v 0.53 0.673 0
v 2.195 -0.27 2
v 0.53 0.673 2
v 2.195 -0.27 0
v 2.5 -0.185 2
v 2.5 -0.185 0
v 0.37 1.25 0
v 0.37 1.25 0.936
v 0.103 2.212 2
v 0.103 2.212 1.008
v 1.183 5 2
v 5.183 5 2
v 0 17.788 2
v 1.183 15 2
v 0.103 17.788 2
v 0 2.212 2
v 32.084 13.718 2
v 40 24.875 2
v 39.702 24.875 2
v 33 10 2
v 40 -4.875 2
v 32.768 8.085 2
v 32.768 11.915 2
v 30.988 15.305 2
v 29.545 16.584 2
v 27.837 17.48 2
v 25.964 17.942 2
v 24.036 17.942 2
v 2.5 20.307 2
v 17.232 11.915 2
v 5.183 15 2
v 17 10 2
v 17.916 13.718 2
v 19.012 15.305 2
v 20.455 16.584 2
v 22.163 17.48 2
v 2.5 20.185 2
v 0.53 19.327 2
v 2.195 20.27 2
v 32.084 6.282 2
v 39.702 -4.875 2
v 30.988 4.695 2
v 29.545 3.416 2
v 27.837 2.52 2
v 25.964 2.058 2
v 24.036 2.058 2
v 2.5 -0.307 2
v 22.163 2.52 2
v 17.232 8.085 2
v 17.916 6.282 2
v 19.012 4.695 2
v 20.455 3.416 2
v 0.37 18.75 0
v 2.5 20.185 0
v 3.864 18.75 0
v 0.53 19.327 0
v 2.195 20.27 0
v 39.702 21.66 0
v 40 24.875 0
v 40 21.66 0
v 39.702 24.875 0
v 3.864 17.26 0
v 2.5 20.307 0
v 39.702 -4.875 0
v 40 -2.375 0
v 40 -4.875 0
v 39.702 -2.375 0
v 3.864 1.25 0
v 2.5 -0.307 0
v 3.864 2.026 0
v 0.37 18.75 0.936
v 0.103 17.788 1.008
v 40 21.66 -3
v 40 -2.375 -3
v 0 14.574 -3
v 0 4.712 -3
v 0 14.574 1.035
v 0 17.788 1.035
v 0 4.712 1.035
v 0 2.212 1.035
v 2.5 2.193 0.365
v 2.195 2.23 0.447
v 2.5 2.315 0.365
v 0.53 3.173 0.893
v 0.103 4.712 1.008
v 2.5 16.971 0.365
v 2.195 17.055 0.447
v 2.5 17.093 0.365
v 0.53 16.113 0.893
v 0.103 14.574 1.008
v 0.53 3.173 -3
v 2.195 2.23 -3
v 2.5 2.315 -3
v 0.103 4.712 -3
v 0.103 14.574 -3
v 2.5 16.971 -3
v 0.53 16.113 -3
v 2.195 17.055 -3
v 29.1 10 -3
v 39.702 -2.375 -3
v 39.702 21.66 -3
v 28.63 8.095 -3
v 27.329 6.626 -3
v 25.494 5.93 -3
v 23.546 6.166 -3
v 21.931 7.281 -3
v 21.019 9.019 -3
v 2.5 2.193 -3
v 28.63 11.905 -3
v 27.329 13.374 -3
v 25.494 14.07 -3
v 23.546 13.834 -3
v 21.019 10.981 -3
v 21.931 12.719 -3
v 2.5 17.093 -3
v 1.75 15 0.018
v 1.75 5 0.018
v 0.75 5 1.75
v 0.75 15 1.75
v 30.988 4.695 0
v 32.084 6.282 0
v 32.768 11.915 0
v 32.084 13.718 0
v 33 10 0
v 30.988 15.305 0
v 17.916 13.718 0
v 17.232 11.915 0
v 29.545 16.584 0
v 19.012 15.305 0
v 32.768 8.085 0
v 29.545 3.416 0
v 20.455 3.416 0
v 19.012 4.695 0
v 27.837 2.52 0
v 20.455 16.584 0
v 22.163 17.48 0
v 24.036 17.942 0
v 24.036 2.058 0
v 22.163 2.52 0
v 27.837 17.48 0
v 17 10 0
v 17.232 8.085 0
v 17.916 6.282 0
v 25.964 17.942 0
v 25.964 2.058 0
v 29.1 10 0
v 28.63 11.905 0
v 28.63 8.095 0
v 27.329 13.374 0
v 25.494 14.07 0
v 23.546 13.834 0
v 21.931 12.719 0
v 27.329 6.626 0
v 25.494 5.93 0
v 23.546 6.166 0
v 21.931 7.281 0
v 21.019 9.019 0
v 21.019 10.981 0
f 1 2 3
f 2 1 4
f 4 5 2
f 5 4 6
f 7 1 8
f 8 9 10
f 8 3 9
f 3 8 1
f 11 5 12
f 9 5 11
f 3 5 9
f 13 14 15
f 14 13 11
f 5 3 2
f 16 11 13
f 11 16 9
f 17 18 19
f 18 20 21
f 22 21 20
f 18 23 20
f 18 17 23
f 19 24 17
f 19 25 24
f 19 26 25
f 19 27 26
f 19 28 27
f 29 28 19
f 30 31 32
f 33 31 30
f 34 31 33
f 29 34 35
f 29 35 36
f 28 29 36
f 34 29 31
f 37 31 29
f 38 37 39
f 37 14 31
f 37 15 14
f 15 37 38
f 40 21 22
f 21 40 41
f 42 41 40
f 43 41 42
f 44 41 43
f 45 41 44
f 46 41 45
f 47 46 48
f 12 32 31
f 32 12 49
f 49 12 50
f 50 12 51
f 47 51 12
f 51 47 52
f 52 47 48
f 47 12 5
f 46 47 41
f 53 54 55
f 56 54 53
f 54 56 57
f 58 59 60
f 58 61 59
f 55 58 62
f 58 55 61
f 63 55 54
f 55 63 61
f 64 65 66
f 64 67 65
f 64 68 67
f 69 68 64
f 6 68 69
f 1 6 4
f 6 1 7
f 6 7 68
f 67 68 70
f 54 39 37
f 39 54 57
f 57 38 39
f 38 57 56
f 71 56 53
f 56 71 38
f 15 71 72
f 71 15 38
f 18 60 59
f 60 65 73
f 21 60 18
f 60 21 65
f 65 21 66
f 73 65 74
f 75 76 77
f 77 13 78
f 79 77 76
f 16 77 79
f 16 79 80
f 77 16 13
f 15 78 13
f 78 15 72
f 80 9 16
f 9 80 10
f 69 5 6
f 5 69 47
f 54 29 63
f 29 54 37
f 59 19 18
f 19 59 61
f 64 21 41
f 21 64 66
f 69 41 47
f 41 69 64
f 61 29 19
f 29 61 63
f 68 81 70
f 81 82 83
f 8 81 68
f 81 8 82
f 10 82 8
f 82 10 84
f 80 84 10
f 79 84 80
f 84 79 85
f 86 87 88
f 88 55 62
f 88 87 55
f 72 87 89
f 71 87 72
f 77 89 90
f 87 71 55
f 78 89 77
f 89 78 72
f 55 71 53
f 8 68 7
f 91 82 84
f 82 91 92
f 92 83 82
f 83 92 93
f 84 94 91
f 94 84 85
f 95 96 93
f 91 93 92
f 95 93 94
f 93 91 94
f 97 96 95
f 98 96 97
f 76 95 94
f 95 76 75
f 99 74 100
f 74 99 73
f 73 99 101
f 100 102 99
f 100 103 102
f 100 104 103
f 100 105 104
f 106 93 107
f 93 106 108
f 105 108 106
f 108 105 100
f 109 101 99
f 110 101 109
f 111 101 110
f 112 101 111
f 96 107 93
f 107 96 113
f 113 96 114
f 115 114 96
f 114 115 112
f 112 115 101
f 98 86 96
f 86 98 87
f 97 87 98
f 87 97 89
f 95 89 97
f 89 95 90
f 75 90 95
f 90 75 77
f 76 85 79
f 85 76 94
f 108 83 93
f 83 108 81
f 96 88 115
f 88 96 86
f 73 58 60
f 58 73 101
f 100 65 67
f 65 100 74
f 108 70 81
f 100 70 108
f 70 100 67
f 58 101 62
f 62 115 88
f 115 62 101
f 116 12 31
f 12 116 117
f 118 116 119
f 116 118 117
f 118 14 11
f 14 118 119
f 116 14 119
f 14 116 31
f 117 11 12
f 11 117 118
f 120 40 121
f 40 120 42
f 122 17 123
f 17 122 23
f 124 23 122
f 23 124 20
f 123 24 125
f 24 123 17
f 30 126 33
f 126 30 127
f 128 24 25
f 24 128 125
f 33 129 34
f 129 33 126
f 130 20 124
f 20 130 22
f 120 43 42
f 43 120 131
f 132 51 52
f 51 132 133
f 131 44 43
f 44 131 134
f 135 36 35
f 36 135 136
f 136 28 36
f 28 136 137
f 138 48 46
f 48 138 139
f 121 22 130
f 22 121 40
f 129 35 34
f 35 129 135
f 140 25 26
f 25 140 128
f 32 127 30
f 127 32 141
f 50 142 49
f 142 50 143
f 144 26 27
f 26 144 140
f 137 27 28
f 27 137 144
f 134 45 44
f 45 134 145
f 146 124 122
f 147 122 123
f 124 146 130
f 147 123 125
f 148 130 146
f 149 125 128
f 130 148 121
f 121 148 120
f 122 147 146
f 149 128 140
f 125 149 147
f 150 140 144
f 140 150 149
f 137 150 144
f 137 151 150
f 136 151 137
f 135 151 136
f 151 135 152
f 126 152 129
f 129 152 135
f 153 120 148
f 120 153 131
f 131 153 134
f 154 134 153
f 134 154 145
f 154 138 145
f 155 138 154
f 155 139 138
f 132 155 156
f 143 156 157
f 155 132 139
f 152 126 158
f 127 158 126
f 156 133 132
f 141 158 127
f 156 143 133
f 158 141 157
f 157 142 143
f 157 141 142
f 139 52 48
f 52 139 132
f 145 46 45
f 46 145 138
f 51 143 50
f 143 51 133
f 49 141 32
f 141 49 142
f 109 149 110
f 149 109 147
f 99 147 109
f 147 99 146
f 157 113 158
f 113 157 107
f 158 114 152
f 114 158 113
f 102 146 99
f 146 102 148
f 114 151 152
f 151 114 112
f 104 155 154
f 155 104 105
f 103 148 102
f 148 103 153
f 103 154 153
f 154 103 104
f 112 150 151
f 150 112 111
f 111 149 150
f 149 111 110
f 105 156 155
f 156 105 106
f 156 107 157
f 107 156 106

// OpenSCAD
difference(){
insert();
union(){
translate([25,10,2])cylinder(h=4,r1=8,r2=8,center=true);
translate([25,10,-2])cylinder(h=6,r1=4.1,r2=4.1,center=true);
}
}
//translate([41,-5,0])cube([2,30,2]);



/*********************************************************
 Everything after this point is just to draw the  gorillapod insert
 *********************************************************/
module insert(standOffHeight=3)
{
	insertAngle =7;
	insertLength=40;
	baseThick=2;
	Wbase=20;
	difference()
	{
		union(){
		difference(){
			color([1,0,0])roundedTrapezoid(thick=baseThick, angle=insertAngle, r1=0, r2=2.5, baseW=Wbase, length=insertLength);
			rotate([0,15,0])translate([-0.5,Wbase/2 - 17.5/2,-6])cube([15,17.5,7]);
		}
		translate([0,Wbase/8,-1*standOffHeight])
		color([0,1,0])roundedTrapezoid(thick=standOffHeight+2, angle=insertAngle, r1=0, r2=2.5, baseW=Wbase/1.4, length=insertLength);
		}
		translate([0.75,Wbase/4,1.75])rotate([0,60,0])cube([2,10,4]);
	}
}


/*********************************************************
Rounded Trapezoid modules were stolen directly from the Pocket Coin-Op
 *********************************************************/
module roundedTrapezoid(thick=5, length=19.5, r1=2, r2=9.5, angle=13.5, baseW=23) 
{
x1 = length*sin(angle);
difference()
{
trapezoidSolid(thick = thick, length = length, r1=r1, r2=r2, angle = angle, baseW=baseW);
translate([length,-1*x1,0])cube([2*r2-length,baseW+2*x1,thick]);
rotate([0,0,-1*angle])translate([0,-1*(r1+r2+5),0])cube([length,r1+r2+5, thick]);
translate([0,baseW,0]) rotate([0,0,angle])cube([ length,r1+r2+5, thick]);
}
}


module trapezoidSolid(thick=5, length=19.5, r1=1, r2=9.5, angle=13.5, baseW=23)
{
r1oSet = length/cos(angle)-r1*tan((90+angle)/2);// -r1-r1*tan(angle);//-r1/cos(angle);
sideoSet = r2*tan((90-angle)/2);// r2*(1- tan(angle));
sidelen = r1oSet-sideoSet;
bottomoSet = (length*sin(angle))-r1*tan((90+angle)/2);

rotate([0,0,-1*angle])
{
translate([r1oSet,r1,0])cylinder(h=thick, r=r1);
translate([sideoSet,r2,0])cylinder(h=thick,r=r2);
translate([sideoSet,0,0]) cube([sidelen,2*r1,thick]);
}
translate([0,baseW,0])rotate([0,0,angle])
{
translate([0,-2*r1,0])
{
translate([r1oSet,r1,0])cylinder(h=thick, r=r1);
translate([sideoSet,-r2+2*r1,0])cylinder(h=thick,r=r2);
translate([sideoSet,0,0]) cube([sidelen,2*r1,thick]);
}
}
translate([0,sideoSet,0])cube([length,baseW-2*sideoSet,thick]);
translate([r2,-bottomoSet,0])cube([length-r2,baseW+2*bottomoSet,thick]);
}
